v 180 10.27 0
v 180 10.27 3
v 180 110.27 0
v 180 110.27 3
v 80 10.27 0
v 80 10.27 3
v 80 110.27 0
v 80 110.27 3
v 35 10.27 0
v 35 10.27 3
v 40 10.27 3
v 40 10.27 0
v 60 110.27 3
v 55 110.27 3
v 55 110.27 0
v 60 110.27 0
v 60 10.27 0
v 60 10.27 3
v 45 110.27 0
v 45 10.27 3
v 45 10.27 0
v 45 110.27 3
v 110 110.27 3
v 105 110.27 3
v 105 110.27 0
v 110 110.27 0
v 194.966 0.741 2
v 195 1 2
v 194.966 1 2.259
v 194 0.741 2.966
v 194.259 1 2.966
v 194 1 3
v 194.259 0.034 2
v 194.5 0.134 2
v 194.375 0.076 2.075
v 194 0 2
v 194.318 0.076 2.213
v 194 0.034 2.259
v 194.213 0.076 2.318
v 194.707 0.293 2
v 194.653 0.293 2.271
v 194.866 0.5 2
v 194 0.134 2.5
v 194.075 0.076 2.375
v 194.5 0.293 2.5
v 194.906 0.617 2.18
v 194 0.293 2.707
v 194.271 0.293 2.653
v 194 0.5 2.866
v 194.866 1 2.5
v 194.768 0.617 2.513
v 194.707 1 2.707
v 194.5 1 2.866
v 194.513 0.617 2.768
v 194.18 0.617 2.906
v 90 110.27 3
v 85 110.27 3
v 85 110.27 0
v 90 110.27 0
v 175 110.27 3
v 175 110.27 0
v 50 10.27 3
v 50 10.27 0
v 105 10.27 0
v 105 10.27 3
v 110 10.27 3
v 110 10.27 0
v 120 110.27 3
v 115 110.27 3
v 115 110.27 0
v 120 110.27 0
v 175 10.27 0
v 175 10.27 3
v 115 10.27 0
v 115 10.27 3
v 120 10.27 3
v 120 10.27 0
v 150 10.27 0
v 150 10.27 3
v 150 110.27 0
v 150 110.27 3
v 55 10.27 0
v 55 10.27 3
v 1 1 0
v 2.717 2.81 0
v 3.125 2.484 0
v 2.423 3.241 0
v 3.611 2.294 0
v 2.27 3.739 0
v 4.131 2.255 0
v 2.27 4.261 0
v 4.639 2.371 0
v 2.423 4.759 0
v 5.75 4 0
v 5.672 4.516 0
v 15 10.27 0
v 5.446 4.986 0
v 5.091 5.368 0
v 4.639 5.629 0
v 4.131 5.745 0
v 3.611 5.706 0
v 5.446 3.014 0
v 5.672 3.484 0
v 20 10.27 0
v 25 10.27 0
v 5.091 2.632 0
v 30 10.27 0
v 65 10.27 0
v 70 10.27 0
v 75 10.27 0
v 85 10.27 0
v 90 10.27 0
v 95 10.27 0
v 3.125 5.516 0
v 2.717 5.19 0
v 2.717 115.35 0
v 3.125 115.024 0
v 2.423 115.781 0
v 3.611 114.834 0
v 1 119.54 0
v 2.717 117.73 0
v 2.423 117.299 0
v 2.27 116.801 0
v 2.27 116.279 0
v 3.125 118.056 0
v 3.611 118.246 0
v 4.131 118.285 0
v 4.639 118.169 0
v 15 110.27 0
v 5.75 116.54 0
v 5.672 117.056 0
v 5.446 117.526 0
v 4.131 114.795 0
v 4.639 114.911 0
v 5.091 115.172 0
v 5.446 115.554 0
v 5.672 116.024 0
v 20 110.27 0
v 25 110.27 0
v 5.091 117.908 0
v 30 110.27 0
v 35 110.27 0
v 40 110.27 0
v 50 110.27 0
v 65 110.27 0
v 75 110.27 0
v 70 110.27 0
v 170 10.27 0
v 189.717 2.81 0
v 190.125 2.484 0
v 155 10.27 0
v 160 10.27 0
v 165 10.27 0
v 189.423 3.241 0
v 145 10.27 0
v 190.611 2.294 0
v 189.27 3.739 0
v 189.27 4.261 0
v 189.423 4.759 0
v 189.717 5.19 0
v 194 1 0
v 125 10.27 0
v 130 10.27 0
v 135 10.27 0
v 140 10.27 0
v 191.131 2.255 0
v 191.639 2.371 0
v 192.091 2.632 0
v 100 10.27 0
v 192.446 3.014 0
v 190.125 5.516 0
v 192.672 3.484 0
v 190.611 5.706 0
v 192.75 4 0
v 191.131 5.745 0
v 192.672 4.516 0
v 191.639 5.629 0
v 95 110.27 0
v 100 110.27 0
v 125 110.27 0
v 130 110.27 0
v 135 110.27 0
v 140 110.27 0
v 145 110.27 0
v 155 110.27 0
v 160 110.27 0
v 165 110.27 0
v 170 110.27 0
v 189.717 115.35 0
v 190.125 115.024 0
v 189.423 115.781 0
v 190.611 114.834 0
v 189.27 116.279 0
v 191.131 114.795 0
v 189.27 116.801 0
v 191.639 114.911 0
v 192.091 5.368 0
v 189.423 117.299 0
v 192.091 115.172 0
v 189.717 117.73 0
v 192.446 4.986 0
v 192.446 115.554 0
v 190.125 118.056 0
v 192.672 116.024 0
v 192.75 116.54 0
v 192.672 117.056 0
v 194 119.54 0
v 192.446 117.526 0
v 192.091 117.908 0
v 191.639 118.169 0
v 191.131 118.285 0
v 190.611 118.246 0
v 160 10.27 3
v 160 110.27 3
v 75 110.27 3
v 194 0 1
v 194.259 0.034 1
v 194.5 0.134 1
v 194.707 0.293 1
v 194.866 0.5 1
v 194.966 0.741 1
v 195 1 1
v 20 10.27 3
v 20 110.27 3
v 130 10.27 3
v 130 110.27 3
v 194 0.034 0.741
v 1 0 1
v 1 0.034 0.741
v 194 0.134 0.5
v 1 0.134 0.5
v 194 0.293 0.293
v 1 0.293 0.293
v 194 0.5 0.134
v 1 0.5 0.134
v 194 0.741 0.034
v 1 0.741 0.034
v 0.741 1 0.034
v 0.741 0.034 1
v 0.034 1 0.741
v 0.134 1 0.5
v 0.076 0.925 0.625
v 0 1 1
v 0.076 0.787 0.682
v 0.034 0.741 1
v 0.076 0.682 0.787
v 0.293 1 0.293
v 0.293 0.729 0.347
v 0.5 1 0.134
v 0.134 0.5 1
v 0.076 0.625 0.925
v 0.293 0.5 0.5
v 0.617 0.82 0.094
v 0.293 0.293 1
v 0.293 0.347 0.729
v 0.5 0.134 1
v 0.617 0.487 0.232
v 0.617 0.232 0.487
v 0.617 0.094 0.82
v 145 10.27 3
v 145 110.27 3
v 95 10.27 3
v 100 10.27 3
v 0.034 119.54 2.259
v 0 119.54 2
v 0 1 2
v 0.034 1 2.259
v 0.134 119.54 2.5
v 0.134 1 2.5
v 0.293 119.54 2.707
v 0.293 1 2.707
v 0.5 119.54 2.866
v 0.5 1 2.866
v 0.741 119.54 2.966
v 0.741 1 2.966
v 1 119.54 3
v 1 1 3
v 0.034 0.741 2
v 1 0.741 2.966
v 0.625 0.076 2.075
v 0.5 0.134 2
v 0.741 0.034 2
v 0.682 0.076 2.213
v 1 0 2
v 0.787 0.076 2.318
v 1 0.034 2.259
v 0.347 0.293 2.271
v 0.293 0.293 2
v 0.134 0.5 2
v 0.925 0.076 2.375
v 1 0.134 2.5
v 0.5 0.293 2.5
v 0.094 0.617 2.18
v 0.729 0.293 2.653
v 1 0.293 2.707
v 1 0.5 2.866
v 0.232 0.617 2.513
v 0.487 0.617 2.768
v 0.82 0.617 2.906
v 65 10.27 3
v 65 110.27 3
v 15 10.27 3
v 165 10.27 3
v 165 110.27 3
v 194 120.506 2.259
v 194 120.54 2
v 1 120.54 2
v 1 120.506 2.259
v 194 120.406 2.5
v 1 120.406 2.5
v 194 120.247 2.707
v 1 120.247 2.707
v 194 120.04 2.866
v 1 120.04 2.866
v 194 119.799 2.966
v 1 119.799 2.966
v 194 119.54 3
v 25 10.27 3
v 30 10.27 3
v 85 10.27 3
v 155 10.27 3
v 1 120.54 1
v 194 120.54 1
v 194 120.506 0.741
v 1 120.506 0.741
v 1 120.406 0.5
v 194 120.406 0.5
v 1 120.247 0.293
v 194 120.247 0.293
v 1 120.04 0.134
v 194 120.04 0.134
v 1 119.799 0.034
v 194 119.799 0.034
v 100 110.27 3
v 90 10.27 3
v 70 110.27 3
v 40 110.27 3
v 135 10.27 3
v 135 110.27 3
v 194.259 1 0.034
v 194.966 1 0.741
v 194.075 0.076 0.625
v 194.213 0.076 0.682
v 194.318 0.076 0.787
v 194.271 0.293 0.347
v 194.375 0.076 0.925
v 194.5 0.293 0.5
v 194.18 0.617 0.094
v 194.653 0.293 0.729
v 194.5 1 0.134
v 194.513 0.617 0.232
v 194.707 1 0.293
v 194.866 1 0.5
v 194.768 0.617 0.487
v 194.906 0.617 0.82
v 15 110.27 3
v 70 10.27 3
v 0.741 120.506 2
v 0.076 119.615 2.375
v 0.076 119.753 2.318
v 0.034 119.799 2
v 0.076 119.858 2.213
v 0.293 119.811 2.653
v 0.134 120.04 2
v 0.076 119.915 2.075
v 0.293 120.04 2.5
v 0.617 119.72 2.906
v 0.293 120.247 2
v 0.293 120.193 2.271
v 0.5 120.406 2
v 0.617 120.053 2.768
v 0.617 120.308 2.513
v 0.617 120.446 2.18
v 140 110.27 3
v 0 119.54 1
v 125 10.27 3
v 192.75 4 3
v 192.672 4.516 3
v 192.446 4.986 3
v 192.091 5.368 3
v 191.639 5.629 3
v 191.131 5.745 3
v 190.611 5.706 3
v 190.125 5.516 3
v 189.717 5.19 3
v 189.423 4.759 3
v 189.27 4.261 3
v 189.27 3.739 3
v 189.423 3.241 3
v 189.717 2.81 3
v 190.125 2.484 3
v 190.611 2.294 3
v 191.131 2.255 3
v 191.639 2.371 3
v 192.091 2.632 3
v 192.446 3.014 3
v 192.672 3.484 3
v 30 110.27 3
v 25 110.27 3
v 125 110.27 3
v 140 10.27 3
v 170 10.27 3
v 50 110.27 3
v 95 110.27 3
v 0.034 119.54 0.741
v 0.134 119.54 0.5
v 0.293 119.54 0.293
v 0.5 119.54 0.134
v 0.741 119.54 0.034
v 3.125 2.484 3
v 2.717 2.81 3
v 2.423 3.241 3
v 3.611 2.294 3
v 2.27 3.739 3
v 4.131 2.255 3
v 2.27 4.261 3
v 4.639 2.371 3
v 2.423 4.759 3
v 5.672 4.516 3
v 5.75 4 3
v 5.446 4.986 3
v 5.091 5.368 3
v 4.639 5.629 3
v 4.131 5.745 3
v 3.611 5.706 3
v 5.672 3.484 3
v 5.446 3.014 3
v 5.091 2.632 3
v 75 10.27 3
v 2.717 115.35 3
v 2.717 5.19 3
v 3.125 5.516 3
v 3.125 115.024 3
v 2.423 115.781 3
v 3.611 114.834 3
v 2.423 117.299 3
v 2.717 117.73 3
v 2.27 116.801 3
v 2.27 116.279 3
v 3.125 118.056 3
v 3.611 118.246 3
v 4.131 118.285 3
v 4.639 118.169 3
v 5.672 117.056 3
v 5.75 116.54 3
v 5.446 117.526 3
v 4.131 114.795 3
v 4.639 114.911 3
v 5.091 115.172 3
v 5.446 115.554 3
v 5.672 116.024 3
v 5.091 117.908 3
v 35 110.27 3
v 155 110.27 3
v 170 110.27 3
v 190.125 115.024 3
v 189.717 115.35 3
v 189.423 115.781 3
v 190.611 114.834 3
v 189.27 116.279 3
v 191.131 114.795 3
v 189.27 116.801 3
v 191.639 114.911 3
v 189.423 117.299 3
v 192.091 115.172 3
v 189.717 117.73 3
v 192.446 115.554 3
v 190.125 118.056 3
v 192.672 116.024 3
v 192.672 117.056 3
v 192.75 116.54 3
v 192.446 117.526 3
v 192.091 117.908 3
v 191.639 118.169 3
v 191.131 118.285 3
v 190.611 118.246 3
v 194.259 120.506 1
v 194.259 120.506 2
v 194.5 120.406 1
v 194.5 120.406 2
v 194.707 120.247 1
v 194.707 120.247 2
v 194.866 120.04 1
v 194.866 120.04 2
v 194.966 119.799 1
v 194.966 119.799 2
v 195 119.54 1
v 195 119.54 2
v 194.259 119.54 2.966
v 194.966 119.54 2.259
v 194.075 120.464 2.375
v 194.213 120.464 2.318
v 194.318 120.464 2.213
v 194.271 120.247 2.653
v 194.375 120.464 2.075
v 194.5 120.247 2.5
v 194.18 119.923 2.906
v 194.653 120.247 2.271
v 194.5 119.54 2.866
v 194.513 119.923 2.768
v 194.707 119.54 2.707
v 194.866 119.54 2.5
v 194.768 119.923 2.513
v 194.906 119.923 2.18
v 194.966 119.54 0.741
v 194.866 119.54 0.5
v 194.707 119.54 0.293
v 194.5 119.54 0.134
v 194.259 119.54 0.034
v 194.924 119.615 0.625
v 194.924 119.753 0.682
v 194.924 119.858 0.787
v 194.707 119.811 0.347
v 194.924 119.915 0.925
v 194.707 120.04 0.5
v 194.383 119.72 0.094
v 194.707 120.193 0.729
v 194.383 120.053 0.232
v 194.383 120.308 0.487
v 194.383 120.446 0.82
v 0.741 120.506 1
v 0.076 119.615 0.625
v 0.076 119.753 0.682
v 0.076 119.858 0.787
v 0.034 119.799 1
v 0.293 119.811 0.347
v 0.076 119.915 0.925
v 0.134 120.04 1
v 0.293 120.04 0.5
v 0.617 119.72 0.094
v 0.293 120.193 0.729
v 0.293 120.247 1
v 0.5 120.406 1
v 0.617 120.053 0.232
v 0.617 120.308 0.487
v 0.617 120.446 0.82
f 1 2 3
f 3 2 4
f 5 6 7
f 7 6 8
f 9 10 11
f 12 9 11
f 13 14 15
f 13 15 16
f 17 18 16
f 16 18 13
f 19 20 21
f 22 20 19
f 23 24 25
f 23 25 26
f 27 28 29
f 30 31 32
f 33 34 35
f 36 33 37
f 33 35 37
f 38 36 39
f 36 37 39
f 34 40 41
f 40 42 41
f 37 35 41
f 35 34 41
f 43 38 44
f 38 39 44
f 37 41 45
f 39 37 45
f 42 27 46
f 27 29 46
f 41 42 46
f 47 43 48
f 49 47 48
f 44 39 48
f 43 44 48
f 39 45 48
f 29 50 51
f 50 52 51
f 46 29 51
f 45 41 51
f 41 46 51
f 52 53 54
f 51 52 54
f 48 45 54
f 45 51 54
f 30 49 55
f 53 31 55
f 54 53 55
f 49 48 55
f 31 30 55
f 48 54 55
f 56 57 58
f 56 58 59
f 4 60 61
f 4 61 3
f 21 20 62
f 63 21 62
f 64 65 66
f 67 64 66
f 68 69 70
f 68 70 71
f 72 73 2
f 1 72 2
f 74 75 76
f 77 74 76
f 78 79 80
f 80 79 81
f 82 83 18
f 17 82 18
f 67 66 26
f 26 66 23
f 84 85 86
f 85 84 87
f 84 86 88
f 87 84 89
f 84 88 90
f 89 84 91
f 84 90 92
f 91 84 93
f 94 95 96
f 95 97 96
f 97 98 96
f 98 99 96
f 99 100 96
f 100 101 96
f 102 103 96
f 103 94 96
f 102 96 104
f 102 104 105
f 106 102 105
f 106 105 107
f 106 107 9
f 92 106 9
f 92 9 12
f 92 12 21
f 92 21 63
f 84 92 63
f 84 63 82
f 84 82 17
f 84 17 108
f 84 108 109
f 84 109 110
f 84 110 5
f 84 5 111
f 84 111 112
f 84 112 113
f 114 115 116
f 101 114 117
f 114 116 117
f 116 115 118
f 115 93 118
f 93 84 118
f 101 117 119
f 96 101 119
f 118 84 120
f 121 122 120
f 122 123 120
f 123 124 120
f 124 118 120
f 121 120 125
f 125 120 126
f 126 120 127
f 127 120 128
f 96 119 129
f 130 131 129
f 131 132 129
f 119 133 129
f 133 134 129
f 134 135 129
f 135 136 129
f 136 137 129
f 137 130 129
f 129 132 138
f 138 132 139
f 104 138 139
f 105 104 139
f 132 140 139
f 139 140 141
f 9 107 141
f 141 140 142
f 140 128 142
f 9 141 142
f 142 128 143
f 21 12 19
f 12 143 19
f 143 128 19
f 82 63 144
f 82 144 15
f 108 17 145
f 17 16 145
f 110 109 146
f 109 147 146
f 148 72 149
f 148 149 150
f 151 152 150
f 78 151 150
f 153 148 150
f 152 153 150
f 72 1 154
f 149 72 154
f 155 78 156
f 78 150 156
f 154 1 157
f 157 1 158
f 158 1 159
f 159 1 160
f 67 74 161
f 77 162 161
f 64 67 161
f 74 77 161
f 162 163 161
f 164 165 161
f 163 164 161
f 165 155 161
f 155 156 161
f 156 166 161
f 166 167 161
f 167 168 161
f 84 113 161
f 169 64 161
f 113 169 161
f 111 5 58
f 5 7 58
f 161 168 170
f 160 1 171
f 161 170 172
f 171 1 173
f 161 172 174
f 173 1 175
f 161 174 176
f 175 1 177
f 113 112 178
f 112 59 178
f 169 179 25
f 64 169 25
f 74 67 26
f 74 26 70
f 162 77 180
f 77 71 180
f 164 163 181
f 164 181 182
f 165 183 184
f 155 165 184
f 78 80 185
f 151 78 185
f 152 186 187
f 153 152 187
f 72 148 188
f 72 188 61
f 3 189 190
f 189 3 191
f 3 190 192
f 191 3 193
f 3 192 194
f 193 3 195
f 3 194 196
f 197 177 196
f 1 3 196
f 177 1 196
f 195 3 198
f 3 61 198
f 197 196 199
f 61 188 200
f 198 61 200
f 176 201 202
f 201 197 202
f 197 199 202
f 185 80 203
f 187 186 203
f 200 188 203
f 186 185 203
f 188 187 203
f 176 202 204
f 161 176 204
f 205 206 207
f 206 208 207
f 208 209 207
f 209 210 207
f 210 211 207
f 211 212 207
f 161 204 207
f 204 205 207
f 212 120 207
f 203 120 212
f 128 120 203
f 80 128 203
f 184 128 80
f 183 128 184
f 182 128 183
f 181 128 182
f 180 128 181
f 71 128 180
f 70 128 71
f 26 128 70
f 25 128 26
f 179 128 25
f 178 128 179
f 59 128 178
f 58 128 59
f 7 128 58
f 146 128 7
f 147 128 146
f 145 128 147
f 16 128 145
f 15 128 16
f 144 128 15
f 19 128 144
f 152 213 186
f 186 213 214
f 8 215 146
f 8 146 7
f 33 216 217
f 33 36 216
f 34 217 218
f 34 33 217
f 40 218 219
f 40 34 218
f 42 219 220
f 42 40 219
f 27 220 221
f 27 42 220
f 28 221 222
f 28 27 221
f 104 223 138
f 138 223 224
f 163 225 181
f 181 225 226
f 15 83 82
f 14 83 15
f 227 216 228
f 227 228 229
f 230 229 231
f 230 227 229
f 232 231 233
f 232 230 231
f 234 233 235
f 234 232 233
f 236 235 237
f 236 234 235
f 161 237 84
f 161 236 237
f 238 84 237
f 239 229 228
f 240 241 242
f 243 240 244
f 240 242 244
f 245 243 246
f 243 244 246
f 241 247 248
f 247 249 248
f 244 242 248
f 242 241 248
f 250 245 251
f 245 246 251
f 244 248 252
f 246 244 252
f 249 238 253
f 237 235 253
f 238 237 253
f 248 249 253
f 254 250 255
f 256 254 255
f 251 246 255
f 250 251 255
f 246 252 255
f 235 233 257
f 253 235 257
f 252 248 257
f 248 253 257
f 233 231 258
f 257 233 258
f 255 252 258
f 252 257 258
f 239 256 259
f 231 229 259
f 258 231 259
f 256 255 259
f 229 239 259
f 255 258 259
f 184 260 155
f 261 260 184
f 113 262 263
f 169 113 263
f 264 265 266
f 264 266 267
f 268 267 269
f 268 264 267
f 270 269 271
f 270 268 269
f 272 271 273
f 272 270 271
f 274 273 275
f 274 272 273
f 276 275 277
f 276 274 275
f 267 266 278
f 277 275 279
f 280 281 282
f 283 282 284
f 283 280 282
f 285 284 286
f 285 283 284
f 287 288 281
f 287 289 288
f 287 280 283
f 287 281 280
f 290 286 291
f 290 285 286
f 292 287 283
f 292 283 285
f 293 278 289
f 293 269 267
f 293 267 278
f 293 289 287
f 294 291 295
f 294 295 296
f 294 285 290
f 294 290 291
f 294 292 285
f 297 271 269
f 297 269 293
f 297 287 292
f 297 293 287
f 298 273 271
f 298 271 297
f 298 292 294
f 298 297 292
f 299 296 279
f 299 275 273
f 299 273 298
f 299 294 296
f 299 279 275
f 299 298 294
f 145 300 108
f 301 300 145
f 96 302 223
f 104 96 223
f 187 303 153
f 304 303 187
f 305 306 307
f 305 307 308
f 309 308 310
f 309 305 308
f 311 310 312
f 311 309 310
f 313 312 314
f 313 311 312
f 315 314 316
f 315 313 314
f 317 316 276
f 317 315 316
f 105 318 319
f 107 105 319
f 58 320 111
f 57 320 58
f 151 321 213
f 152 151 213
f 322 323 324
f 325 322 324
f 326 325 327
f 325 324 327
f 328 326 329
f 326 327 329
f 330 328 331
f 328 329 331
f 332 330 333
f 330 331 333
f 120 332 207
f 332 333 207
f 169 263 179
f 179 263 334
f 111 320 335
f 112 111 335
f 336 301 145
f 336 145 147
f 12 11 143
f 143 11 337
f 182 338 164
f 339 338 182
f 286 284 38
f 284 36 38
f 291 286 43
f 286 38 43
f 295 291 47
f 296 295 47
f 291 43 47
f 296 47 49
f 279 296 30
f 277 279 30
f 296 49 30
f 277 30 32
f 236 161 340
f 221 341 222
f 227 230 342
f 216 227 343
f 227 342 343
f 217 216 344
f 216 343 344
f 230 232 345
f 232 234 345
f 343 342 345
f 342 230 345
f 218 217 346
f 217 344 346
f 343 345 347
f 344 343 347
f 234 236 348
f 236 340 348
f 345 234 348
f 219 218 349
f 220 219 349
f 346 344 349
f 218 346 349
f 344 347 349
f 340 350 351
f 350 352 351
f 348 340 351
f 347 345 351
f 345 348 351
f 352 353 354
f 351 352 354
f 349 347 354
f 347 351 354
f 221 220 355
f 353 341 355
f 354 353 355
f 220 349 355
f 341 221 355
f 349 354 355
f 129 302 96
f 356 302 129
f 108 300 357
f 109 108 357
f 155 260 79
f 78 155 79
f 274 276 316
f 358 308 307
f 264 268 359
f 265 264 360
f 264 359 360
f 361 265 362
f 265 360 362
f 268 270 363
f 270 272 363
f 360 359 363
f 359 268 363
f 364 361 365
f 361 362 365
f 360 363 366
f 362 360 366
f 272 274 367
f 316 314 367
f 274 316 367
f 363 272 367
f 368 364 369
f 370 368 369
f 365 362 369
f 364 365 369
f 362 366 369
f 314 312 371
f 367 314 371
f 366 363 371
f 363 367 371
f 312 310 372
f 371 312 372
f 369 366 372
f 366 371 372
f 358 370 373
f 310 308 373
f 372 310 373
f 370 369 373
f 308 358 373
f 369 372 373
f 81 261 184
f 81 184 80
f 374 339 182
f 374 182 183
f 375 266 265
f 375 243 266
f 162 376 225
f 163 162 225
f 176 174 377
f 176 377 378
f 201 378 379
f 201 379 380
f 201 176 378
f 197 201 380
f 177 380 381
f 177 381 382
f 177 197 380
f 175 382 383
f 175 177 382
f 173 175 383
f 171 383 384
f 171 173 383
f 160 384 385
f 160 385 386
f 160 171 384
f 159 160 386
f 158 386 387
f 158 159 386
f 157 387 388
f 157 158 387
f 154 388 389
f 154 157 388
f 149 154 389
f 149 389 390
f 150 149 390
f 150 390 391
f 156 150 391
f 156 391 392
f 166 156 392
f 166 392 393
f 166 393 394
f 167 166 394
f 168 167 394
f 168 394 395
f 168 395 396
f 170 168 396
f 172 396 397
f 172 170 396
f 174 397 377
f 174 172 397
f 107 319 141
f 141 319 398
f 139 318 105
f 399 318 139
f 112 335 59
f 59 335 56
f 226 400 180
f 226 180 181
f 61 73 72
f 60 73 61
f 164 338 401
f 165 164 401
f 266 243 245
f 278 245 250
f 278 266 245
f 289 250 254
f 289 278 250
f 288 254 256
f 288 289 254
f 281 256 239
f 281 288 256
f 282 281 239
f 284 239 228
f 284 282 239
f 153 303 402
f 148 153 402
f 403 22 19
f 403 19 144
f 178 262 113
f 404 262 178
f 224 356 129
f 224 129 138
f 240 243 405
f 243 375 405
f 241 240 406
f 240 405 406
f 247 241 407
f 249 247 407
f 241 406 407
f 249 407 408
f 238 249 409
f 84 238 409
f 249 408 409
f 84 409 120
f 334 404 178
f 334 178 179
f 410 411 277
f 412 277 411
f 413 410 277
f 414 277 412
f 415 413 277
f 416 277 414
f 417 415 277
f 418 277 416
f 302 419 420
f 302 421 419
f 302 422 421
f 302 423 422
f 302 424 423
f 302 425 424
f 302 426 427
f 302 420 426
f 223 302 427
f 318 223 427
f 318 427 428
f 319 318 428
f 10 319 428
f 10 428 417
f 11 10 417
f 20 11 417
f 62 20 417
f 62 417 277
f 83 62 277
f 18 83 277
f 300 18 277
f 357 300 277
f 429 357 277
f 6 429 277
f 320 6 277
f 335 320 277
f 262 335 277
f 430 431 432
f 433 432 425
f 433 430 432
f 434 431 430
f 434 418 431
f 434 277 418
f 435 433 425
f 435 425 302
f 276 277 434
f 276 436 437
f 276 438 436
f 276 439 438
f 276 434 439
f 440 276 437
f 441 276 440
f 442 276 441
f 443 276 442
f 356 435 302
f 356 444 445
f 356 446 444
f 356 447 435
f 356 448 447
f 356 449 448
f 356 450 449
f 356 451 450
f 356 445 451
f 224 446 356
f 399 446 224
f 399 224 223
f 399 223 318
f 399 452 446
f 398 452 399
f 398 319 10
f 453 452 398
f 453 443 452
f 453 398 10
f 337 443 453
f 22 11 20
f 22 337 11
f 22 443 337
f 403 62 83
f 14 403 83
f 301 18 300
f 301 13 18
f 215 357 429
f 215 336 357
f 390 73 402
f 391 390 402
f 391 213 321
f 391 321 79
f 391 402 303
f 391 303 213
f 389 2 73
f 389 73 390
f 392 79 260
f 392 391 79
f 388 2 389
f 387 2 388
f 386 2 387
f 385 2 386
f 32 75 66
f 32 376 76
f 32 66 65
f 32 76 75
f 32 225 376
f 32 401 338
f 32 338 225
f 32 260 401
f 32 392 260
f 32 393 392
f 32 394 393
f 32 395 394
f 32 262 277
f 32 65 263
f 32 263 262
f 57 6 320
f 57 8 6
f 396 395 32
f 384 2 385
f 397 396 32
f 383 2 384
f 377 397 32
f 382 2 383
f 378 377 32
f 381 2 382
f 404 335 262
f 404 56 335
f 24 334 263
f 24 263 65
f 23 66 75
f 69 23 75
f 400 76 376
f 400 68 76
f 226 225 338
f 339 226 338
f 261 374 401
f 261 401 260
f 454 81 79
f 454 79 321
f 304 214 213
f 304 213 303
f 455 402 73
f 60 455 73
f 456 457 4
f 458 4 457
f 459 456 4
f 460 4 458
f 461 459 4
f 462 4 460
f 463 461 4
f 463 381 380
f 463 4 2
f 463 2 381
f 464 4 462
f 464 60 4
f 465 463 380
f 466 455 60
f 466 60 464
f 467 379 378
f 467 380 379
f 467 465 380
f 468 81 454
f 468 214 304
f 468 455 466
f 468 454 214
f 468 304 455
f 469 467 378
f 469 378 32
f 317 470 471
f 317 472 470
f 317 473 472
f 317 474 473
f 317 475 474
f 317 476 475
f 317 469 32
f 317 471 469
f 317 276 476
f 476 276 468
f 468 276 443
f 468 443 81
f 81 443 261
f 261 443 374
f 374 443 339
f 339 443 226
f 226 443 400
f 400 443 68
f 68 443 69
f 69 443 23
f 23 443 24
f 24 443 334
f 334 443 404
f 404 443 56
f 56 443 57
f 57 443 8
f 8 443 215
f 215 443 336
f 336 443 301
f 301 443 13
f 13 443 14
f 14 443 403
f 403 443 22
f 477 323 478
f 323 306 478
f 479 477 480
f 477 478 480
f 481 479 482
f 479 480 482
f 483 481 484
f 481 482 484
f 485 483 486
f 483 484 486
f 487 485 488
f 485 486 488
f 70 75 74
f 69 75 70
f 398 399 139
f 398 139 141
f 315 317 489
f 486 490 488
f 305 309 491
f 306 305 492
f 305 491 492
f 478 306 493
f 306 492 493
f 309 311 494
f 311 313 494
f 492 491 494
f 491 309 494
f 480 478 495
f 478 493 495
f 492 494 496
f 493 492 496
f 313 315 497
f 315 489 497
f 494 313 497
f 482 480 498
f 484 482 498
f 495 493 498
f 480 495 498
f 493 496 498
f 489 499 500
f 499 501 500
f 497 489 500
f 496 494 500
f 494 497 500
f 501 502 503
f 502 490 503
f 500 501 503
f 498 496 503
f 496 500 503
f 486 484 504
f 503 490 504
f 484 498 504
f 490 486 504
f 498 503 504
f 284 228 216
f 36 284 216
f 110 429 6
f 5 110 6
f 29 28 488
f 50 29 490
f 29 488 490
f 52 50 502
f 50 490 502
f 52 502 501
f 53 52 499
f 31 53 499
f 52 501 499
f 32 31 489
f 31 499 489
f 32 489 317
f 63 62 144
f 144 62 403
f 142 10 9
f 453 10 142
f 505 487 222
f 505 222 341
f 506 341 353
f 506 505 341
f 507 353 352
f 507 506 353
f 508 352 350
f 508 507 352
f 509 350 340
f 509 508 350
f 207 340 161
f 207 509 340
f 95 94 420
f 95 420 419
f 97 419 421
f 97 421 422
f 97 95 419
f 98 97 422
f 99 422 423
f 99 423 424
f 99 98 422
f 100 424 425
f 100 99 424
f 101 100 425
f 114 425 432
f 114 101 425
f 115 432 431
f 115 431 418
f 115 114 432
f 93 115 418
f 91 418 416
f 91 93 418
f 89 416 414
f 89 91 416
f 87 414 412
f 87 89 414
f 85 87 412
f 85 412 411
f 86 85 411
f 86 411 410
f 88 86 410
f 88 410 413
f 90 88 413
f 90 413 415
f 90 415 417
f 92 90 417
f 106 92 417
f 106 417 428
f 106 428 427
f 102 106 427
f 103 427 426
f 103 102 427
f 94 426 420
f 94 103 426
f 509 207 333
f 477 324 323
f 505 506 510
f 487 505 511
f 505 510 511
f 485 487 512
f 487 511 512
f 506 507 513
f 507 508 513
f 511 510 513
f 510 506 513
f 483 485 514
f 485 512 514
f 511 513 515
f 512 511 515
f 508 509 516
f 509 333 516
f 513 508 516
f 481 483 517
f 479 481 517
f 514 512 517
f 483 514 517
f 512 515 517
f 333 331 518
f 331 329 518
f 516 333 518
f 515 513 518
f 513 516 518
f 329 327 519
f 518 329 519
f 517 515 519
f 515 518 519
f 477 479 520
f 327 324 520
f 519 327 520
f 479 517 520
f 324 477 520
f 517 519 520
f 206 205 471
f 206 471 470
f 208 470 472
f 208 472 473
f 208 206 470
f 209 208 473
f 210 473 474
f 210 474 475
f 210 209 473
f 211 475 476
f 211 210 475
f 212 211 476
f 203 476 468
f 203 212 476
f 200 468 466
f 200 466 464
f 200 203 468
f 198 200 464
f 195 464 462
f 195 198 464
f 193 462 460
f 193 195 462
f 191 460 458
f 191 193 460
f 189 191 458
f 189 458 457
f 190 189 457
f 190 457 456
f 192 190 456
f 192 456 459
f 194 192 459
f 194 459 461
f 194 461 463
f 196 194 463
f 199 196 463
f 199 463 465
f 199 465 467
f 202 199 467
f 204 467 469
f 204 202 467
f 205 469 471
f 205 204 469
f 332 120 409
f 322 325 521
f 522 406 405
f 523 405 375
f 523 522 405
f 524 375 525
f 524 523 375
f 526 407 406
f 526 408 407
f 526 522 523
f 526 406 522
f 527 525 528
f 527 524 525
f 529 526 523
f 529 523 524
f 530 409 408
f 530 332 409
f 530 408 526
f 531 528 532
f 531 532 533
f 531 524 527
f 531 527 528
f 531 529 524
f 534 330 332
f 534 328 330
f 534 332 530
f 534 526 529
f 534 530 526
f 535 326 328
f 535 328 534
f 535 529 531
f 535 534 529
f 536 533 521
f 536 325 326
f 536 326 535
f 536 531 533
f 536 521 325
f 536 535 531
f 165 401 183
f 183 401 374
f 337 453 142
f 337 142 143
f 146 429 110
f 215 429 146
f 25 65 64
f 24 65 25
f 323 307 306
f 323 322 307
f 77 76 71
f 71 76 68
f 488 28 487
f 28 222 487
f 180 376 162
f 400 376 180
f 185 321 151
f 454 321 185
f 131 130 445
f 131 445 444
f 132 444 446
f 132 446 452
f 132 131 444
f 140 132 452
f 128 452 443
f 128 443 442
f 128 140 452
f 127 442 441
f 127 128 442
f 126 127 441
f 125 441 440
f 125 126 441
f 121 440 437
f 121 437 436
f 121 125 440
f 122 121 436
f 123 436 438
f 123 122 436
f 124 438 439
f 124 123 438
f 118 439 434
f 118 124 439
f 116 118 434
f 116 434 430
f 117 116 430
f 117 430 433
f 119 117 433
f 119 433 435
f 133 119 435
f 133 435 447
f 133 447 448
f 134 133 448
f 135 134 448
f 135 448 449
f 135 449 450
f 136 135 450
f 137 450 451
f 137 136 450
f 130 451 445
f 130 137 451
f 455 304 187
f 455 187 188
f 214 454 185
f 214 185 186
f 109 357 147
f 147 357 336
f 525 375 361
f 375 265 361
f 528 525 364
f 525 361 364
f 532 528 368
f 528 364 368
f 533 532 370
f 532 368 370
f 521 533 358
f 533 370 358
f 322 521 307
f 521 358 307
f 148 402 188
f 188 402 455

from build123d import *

# Parameters (mm, degrees)
SKETCH1_W           = 195
SKETCH1_H           = 120.54
SKETCH1_R           = 1.75
BOSS_EXTRUDE1_DEPTH = 3
FILLET1_R           = 1
SKETCH3_W           = 5
SKETCH3_H           = 100
CUT_EXTRUDE1_DEPTH  = 230.268165256


with BuildPart() as part:
    # Sketch1 → Boss-Extrude1 (new body)
    with BuildSketch(Plane.XY):
        with Locations((97.5, 60.27)):
            Rectangle(SKETCH1_W, SKETCH1_H)
        with Locations((4, 116.54)):
            Circle(SKETCH1_R, mode=Mode.SUBTRACT)
        with Locations((191, 116.54)):
            Circle(SKETCH1_R, mode=Mode.SUBTRACT)
        with Locations((4, 4)):
            Circle(SKETCH1_R, mode=Mode.SUBTRACT)
        with Locations((191, 4)):
            Circle(SKETCH1_R, mode=Mode.SUBTRACT)
    extrude(amount=BOSS_EXTRUDE1_DEPTH)

    # Fillet1
    fillet1_edges = [part.edges().sort_by_distance(p)[0] for p in [
        (195, 60.27, 3),
        (97.5, 120.54, 3),
        (0, 60.27, 3),
        (97.5, 120.54, 0),
        (195, 60.27, 0),
        (97.5, 0, 0),
        (0, 60.27, 0),
        (0, 120.54, 1.5),
        (195, 120.54, 1.5),
        (195, 0, 1.5),
        (0, 0, 1.5),
        (97.5, 0, 3),
    ]]
    fillet(fillet1_edges, radius=FILLET1_R)

    # Sketch3 → Cut-Extrude1 (cut, through all)
    with BuildSketch(Plane.XY.offset(3)):
        with Locations((27.5, 60.27)):
            Rectangle(SKETCH3_W, SKETCH3_H)
        with Locations((17.5, 60.27)):
            Rectangle(SKETCH3_W, SKETCH3_H)
        with Locations((37.5, 60.27)):
            Rectangle(SKETCH3_W, SKETCH3_H)
        with Locations((47.5, 60.27)):
            Rectangle(SKETCH3_W, SKETCH3_H)
        with Locations((57.5, 60.27)):
            Rectangle(SKETCH3_W, SKETCH3_H)
        with Locations((67.5, 60.27)):
            Rectangle(SKETCH3_W, SKETCH3_H)
        with Locations((77.5, 60.27)):
            Rectangle(SKETCH3_W, SKETCH3_H)
        with Locations((87.5, 60.27)):
            Rectangle(SKETCH3_W, SKETCH3_H)
        with Locations((97.5, 60.27)):
            Rectangle(SKETCH3_W, SKETCH3_H)
        with Locations((107.5, 60.27)):
            Rectangle(SKETCH3_W, SKETCH3_H)
        with Locations((117.5, 60.27)):
            Rectangle(SKETCH3_W, SKETCH3_H)
        with Locations((127.5, 60.27)):
            Rectangle(SKETCH3_W, SKETCH3_H)
        with Locations((137.5, 60.27)):
            Rectangle(SKETCH3_W, SKETCH3_H)
        with Locations((147.5, 60.27)):
            Rectangle(SKETCH3_W, SKETCH3_H)
        with Locations((157.5, 60.27)):
            Rectangle(SKETCH3_W, SKETCH3_H)
        with Locations((167.5, 60.27)):
            Rectangle(SKETCH3_W, SKETCH3_H)
        with Locations((177.5, 60.27)):
            Rectangle(SKETCH3_W, SKETCH3_H)
    extrude(amount=-CUT_EXTRUDE1_DEPTH, mode=Mode.SUBTRACT)


solid = part.part
